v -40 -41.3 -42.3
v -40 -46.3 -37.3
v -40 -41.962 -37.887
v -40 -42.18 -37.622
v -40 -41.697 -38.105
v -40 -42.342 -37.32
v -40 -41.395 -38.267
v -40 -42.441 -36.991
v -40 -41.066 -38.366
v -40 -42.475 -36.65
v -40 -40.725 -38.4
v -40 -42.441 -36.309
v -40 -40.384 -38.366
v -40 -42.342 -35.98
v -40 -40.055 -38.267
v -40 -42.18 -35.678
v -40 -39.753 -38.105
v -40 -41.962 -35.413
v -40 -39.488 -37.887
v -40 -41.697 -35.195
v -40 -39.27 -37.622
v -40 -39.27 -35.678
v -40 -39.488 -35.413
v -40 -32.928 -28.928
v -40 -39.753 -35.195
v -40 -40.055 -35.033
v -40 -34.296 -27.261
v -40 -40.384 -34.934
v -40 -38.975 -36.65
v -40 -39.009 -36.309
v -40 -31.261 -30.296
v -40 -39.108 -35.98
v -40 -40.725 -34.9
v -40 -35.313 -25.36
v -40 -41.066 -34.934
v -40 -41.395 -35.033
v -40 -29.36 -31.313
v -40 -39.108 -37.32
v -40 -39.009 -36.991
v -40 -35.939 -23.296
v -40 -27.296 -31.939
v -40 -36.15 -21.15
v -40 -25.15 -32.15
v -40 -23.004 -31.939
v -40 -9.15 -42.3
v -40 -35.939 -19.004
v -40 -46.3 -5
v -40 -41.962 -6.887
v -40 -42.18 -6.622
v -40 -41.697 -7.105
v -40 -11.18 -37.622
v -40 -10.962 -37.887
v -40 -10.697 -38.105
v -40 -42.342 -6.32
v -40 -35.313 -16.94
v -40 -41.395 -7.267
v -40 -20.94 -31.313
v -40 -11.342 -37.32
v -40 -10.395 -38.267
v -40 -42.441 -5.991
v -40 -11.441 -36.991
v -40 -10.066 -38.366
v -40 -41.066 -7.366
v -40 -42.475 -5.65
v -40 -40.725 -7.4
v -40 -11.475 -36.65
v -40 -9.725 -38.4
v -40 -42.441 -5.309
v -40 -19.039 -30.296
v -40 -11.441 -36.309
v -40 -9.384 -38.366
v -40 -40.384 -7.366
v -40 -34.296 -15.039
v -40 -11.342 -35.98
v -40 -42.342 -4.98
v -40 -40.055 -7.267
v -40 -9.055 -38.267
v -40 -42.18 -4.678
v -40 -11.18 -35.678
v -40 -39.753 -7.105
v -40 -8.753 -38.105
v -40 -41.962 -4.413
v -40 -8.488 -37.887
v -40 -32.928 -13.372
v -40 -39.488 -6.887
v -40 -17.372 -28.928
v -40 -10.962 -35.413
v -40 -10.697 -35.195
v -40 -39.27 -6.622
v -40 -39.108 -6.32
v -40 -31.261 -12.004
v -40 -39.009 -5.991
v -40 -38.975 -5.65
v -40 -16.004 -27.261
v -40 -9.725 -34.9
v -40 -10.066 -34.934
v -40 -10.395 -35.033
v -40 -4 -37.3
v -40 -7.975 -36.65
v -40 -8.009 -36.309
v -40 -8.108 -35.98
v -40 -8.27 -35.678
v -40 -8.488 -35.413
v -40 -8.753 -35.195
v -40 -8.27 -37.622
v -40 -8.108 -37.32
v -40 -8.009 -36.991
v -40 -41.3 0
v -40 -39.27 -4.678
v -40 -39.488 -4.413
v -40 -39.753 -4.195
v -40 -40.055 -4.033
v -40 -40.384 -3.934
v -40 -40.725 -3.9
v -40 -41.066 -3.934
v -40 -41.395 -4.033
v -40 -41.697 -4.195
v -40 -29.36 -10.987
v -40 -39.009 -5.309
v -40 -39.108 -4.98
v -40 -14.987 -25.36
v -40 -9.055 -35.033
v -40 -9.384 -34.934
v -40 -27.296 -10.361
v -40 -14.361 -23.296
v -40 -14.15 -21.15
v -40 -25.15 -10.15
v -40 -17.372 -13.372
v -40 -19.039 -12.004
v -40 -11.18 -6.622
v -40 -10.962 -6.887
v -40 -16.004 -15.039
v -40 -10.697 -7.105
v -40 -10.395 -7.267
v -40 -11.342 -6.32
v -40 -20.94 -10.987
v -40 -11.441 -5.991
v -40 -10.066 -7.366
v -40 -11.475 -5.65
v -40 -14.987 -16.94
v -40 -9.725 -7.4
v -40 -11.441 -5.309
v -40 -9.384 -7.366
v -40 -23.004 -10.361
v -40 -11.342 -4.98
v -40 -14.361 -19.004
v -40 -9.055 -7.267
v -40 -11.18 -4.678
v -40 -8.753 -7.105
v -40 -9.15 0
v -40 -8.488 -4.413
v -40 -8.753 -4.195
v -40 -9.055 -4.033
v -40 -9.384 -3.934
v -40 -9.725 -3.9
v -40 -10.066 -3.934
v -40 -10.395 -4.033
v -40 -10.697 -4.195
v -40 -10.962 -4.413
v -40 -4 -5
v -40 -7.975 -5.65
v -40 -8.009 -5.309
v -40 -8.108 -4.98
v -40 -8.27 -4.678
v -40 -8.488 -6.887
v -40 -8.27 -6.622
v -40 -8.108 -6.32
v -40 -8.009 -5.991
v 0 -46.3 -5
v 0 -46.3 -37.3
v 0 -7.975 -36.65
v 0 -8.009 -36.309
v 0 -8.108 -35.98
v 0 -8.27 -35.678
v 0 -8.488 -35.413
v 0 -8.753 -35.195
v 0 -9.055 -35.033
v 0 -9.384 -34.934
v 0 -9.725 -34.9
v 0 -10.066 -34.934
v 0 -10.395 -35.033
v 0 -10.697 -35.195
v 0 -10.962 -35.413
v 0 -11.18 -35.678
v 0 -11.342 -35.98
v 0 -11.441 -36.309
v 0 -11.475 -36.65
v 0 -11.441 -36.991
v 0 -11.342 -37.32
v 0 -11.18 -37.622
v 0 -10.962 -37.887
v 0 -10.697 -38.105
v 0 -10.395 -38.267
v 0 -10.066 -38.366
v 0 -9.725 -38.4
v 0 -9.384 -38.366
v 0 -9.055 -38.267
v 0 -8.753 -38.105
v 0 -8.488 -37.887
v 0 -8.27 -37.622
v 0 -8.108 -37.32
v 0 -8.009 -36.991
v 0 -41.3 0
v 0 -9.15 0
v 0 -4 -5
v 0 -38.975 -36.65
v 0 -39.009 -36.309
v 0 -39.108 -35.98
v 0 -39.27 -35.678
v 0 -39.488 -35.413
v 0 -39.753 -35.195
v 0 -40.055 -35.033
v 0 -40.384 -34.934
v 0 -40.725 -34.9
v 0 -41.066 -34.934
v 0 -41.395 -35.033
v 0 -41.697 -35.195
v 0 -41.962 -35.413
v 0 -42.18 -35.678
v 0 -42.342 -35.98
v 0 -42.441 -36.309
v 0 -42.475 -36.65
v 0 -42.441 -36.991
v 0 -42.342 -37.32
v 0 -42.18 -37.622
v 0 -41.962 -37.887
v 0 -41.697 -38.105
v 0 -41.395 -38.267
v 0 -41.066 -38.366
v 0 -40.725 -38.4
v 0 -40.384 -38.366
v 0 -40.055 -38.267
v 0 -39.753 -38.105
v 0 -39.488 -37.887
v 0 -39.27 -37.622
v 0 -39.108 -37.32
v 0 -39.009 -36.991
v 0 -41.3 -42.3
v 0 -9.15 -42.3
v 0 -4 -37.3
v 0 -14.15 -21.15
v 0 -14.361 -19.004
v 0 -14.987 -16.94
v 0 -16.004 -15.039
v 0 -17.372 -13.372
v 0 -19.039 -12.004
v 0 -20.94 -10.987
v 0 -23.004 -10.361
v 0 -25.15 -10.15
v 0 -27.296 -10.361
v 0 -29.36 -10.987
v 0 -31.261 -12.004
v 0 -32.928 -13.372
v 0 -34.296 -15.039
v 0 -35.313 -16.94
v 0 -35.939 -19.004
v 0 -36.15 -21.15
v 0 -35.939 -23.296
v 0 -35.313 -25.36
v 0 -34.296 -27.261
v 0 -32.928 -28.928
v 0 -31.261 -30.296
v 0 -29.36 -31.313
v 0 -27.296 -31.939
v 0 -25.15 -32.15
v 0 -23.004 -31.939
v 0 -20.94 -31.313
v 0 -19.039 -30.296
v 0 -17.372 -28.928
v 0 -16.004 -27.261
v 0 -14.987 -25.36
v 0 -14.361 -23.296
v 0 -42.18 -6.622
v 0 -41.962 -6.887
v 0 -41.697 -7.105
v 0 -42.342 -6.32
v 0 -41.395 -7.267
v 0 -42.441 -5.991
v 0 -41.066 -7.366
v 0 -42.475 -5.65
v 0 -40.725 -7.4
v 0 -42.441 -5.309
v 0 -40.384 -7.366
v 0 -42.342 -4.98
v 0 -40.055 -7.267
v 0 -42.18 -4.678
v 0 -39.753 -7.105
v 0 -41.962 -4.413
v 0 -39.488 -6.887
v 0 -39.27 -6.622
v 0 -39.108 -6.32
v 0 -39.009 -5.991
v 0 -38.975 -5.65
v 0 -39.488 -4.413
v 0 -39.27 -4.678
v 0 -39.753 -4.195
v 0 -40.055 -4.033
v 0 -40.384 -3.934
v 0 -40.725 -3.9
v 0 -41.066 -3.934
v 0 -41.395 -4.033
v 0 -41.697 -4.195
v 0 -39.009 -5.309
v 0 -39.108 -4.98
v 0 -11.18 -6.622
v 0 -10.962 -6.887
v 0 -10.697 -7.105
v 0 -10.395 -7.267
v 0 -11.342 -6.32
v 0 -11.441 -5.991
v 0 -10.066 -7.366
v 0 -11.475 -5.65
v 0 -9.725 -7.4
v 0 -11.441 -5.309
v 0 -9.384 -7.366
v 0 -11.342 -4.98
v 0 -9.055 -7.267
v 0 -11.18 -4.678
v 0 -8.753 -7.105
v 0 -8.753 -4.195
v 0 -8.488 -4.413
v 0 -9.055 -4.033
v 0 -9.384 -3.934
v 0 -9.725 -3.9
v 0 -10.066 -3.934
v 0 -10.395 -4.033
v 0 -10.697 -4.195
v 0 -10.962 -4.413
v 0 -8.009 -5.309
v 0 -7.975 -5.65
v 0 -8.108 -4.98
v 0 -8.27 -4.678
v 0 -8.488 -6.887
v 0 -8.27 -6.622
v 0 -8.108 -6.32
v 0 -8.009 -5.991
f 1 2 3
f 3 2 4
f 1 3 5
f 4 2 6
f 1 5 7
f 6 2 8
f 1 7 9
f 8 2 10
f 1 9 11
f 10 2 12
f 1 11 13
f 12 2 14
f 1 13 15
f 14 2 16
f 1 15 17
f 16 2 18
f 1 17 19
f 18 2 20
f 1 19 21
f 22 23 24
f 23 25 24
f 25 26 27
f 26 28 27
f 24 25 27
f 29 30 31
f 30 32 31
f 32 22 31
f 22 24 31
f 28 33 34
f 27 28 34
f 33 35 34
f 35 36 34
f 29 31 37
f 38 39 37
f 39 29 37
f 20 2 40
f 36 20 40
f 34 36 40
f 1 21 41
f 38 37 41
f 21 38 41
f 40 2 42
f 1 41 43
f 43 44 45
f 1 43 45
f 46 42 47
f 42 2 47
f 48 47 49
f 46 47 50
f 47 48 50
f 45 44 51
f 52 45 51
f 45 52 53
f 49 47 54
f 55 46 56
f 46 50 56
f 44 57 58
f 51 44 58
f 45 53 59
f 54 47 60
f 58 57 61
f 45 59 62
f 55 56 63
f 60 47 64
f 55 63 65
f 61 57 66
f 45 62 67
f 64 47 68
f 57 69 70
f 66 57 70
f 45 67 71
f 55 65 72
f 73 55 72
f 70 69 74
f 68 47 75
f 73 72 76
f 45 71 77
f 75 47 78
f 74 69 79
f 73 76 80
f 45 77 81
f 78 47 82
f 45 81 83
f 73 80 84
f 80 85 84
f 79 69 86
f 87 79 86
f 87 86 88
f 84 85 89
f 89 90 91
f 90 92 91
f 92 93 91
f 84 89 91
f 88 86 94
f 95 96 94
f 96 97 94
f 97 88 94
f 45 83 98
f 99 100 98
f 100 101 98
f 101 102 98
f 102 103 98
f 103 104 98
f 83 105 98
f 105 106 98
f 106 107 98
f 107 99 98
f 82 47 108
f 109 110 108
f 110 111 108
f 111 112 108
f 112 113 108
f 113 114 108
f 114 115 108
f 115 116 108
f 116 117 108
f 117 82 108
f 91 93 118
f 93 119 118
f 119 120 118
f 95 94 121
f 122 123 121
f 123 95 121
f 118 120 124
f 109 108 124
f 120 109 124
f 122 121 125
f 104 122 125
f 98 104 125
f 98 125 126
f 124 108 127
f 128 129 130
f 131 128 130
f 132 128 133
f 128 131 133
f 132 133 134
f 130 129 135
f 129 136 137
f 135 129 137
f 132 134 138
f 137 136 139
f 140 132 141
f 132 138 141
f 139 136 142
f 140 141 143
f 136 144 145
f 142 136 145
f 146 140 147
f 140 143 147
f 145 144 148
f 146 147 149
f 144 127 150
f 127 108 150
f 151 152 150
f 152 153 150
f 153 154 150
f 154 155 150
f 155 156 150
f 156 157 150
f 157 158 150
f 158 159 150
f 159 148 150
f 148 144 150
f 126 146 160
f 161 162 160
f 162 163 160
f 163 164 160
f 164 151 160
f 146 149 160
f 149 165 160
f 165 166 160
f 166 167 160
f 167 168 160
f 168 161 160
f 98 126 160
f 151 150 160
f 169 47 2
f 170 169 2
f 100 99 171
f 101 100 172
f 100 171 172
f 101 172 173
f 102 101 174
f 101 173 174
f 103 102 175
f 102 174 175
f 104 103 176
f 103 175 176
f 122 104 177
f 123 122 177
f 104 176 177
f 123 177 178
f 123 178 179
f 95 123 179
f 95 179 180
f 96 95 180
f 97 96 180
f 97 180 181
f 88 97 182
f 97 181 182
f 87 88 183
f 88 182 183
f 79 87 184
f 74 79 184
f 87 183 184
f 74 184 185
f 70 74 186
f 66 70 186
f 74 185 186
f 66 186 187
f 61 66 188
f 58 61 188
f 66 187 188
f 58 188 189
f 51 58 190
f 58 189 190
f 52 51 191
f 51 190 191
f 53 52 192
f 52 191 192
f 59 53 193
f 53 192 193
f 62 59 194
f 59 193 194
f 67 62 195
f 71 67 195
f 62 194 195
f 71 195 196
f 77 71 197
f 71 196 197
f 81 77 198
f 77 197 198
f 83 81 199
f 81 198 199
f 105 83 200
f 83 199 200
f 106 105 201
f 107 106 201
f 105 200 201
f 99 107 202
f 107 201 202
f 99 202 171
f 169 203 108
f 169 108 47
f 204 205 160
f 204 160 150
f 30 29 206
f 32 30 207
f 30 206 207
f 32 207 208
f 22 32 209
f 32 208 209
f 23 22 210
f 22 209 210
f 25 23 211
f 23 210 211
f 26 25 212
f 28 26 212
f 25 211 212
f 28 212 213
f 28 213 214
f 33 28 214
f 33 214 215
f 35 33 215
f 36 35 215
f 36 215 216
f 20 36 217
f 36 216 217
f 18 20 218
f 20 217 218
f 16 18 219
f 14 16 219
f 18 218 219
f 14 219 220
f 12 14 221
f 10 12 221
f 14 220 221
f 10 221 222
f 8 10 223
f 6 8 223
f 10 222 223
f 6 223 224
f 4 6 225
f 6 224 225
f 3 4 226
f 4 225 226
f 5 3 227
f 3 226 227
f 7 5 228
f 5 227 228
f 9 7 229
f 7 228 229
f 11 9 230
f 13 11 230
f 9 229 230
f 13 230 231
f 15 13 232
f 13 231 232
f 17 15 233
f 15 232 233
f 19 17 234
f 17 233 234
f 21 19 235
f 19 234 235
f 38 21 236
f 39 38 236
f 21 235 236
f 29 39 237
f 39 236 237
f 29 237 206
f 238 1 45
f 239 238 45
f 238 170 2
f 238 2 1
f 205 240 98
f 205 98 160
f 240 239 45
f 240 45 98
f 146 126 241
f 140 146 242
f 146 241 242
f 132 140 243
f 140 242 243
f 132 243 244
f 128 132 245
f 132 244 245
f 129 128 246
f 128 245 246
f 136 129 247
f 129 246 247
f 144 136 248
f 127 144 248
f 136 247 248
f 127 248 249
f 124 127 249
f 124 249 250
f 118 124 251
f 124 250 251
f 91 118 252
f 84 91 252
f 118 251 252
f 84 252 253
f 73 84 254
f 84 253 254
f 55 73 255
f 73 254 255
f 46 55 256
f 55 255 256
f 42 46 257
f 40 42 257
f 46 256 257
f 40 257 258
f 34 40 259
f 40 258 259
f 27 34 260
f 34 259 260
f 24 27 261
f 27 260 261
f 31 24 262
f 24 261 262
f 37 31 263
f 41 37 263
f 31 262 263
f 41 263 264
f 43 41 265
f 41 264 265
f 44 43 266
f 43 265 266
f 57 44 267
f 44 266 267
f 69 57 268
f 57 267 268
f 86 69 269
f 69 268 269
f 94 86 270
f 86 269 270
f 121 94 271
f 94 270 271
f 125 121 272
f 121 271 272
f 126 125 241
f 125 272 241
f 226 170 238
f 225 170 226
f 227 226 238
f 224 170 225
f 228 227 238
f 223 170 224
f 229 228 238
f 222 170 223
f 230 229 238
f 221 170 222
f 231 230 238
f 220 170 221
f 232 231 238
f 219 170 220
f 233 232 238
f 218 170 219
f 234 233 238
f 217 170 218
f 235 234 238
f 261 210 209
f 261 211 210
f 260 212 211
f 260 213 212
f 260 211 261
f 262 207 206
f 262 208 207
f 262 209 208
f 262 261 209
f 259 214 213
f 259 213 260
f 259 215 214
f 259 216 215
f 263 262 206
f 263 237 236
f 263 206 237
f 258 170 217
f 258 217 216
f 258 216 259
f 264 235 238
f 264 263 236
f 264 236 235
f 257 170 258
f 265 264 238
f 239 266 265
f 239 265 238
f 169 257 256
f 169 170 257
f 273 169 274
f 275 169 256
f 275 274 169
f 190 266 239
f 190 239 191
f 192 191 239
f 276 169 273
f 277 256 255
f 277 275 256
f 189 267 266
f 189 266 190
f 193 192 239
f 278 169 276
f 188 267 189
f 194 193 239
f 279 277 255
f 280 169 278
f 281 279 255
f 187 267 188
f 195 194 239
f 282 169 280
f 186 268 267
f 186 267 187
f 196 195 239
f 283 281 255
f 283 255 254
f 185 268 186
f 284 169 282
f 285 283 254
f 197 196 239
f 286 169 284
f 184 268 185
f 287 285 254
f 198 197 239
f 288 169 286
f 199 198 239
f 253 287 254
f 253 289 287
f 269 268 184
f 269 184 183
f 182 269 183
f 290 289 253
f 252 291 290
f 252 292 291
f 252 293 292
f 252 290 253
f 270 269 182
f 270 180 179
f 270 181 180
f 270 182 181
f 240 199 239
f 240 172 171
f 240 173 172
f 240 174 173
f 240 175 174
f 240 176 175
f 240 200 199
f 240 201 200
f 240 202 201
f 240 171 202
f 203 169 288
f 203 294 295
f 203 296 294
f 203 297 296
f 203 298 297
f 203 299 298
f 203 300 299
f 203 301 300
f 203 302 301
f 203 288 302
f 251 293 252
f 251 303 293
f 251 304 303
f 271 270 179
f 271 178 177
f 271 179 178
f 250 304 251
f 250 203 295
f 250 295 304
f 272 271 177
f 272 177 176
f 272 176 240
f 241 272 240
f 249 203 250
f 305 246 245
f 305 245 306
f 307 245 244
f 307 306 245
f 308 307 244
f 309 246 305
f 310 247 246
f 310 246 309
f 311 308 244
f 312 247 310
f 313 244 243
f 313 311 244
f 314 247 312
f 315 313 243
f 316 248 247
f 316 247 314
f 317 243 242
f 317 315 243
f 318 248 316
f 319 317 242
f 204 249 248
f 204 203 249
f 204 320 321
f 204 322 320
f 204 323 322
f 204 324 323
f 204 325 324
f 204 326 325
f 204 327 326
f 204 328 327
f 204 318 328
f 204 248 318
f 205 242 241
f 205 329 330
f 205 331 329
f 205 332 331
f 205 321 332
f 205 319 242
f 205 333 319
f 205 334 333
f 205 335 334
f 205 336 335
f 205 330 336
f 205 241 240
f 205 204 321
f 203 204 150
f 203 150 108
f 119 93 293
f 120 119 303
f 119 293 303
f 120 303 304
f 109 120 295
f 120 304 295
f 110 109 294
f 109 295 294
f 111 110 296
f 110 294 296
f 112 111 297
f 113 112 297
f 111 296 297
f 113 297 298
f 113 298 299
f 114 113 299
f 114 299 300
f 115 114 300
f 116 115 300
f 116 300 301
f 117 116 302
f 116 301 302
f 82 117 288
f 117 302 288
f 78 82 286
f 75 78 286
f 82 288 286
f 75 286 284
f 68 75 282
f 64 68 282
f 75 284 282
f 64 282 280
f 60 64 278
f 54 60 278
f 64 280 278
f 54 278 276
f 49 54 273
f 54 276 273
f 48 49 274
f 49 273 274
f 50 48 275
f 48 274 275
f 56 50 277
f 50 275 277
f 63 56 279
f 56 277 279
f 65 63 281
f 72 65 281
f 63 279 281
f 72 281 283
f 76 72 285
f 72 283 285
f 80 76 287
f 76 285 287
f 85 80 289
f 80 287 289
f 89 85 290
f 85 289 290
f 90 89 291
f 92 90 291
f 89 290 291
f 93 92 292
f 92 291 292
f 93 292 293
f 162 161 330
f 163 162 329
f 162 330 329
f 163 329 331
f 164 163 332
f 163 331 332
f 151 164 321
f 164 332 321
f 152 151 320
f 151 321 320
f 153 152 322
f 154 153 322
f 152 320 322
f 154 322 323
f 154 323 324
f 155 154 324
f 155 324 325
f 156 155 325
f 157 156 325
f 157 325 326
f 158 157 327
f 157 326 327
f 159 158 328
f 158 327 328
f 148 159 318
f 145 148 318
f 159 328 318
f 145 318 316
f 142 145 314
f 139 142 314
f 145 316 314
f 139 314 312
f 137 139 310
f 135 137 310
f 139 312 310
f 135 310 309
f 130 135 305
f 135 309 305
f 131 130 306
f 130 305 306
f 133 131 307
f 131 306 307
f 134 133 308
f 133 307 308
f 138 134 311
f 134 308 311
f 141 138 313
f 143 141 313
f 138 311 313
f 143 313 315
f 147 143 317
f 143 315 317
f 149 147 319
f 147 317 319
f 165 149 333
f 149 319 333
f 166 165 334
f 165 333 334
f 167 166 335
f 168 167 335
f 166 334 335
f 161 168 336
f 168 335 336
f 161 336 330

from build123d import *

# Parameters (mm, degrees)
F0_R     = 1.75
F0_R_2   = 11
F1_DEPTH = 40


with BuildPart() as f1:
    # F0 (on Right) → F1 (new body)
    with BuildSketch(Plane.YZ):
        Polygon((-46.3, -37.3), (-41.3, -42.3), (-9.15, -42.3), (-4, -37.3), (-4, -5), (-9.15, 0), (-41.3, 0), (-46.3, -5), align=None)
        with Locations((-40.725, -36.65)):
            Circle(F0_R, mode=Mode.SUBTRACT)
        with Locations((-9.725, -36.65)):
            Circle(F0_R, mode=Mode.SUBTRACT)
        with Locations((-40.725, -5.65)):
            Circle(F0_R, mode=Mode.SUBTRACT)
        with Locations((-25.15, -21.15)):
            Circle(F0_R_2, mode=Mode.SUBTRACT)
        with Locations((-9.725, -5.65)):
            Circle(F0_R, mode=Mode.SUBTRACT)
    extrude(amount=-F1_DEPTH)


solid = f1.part
